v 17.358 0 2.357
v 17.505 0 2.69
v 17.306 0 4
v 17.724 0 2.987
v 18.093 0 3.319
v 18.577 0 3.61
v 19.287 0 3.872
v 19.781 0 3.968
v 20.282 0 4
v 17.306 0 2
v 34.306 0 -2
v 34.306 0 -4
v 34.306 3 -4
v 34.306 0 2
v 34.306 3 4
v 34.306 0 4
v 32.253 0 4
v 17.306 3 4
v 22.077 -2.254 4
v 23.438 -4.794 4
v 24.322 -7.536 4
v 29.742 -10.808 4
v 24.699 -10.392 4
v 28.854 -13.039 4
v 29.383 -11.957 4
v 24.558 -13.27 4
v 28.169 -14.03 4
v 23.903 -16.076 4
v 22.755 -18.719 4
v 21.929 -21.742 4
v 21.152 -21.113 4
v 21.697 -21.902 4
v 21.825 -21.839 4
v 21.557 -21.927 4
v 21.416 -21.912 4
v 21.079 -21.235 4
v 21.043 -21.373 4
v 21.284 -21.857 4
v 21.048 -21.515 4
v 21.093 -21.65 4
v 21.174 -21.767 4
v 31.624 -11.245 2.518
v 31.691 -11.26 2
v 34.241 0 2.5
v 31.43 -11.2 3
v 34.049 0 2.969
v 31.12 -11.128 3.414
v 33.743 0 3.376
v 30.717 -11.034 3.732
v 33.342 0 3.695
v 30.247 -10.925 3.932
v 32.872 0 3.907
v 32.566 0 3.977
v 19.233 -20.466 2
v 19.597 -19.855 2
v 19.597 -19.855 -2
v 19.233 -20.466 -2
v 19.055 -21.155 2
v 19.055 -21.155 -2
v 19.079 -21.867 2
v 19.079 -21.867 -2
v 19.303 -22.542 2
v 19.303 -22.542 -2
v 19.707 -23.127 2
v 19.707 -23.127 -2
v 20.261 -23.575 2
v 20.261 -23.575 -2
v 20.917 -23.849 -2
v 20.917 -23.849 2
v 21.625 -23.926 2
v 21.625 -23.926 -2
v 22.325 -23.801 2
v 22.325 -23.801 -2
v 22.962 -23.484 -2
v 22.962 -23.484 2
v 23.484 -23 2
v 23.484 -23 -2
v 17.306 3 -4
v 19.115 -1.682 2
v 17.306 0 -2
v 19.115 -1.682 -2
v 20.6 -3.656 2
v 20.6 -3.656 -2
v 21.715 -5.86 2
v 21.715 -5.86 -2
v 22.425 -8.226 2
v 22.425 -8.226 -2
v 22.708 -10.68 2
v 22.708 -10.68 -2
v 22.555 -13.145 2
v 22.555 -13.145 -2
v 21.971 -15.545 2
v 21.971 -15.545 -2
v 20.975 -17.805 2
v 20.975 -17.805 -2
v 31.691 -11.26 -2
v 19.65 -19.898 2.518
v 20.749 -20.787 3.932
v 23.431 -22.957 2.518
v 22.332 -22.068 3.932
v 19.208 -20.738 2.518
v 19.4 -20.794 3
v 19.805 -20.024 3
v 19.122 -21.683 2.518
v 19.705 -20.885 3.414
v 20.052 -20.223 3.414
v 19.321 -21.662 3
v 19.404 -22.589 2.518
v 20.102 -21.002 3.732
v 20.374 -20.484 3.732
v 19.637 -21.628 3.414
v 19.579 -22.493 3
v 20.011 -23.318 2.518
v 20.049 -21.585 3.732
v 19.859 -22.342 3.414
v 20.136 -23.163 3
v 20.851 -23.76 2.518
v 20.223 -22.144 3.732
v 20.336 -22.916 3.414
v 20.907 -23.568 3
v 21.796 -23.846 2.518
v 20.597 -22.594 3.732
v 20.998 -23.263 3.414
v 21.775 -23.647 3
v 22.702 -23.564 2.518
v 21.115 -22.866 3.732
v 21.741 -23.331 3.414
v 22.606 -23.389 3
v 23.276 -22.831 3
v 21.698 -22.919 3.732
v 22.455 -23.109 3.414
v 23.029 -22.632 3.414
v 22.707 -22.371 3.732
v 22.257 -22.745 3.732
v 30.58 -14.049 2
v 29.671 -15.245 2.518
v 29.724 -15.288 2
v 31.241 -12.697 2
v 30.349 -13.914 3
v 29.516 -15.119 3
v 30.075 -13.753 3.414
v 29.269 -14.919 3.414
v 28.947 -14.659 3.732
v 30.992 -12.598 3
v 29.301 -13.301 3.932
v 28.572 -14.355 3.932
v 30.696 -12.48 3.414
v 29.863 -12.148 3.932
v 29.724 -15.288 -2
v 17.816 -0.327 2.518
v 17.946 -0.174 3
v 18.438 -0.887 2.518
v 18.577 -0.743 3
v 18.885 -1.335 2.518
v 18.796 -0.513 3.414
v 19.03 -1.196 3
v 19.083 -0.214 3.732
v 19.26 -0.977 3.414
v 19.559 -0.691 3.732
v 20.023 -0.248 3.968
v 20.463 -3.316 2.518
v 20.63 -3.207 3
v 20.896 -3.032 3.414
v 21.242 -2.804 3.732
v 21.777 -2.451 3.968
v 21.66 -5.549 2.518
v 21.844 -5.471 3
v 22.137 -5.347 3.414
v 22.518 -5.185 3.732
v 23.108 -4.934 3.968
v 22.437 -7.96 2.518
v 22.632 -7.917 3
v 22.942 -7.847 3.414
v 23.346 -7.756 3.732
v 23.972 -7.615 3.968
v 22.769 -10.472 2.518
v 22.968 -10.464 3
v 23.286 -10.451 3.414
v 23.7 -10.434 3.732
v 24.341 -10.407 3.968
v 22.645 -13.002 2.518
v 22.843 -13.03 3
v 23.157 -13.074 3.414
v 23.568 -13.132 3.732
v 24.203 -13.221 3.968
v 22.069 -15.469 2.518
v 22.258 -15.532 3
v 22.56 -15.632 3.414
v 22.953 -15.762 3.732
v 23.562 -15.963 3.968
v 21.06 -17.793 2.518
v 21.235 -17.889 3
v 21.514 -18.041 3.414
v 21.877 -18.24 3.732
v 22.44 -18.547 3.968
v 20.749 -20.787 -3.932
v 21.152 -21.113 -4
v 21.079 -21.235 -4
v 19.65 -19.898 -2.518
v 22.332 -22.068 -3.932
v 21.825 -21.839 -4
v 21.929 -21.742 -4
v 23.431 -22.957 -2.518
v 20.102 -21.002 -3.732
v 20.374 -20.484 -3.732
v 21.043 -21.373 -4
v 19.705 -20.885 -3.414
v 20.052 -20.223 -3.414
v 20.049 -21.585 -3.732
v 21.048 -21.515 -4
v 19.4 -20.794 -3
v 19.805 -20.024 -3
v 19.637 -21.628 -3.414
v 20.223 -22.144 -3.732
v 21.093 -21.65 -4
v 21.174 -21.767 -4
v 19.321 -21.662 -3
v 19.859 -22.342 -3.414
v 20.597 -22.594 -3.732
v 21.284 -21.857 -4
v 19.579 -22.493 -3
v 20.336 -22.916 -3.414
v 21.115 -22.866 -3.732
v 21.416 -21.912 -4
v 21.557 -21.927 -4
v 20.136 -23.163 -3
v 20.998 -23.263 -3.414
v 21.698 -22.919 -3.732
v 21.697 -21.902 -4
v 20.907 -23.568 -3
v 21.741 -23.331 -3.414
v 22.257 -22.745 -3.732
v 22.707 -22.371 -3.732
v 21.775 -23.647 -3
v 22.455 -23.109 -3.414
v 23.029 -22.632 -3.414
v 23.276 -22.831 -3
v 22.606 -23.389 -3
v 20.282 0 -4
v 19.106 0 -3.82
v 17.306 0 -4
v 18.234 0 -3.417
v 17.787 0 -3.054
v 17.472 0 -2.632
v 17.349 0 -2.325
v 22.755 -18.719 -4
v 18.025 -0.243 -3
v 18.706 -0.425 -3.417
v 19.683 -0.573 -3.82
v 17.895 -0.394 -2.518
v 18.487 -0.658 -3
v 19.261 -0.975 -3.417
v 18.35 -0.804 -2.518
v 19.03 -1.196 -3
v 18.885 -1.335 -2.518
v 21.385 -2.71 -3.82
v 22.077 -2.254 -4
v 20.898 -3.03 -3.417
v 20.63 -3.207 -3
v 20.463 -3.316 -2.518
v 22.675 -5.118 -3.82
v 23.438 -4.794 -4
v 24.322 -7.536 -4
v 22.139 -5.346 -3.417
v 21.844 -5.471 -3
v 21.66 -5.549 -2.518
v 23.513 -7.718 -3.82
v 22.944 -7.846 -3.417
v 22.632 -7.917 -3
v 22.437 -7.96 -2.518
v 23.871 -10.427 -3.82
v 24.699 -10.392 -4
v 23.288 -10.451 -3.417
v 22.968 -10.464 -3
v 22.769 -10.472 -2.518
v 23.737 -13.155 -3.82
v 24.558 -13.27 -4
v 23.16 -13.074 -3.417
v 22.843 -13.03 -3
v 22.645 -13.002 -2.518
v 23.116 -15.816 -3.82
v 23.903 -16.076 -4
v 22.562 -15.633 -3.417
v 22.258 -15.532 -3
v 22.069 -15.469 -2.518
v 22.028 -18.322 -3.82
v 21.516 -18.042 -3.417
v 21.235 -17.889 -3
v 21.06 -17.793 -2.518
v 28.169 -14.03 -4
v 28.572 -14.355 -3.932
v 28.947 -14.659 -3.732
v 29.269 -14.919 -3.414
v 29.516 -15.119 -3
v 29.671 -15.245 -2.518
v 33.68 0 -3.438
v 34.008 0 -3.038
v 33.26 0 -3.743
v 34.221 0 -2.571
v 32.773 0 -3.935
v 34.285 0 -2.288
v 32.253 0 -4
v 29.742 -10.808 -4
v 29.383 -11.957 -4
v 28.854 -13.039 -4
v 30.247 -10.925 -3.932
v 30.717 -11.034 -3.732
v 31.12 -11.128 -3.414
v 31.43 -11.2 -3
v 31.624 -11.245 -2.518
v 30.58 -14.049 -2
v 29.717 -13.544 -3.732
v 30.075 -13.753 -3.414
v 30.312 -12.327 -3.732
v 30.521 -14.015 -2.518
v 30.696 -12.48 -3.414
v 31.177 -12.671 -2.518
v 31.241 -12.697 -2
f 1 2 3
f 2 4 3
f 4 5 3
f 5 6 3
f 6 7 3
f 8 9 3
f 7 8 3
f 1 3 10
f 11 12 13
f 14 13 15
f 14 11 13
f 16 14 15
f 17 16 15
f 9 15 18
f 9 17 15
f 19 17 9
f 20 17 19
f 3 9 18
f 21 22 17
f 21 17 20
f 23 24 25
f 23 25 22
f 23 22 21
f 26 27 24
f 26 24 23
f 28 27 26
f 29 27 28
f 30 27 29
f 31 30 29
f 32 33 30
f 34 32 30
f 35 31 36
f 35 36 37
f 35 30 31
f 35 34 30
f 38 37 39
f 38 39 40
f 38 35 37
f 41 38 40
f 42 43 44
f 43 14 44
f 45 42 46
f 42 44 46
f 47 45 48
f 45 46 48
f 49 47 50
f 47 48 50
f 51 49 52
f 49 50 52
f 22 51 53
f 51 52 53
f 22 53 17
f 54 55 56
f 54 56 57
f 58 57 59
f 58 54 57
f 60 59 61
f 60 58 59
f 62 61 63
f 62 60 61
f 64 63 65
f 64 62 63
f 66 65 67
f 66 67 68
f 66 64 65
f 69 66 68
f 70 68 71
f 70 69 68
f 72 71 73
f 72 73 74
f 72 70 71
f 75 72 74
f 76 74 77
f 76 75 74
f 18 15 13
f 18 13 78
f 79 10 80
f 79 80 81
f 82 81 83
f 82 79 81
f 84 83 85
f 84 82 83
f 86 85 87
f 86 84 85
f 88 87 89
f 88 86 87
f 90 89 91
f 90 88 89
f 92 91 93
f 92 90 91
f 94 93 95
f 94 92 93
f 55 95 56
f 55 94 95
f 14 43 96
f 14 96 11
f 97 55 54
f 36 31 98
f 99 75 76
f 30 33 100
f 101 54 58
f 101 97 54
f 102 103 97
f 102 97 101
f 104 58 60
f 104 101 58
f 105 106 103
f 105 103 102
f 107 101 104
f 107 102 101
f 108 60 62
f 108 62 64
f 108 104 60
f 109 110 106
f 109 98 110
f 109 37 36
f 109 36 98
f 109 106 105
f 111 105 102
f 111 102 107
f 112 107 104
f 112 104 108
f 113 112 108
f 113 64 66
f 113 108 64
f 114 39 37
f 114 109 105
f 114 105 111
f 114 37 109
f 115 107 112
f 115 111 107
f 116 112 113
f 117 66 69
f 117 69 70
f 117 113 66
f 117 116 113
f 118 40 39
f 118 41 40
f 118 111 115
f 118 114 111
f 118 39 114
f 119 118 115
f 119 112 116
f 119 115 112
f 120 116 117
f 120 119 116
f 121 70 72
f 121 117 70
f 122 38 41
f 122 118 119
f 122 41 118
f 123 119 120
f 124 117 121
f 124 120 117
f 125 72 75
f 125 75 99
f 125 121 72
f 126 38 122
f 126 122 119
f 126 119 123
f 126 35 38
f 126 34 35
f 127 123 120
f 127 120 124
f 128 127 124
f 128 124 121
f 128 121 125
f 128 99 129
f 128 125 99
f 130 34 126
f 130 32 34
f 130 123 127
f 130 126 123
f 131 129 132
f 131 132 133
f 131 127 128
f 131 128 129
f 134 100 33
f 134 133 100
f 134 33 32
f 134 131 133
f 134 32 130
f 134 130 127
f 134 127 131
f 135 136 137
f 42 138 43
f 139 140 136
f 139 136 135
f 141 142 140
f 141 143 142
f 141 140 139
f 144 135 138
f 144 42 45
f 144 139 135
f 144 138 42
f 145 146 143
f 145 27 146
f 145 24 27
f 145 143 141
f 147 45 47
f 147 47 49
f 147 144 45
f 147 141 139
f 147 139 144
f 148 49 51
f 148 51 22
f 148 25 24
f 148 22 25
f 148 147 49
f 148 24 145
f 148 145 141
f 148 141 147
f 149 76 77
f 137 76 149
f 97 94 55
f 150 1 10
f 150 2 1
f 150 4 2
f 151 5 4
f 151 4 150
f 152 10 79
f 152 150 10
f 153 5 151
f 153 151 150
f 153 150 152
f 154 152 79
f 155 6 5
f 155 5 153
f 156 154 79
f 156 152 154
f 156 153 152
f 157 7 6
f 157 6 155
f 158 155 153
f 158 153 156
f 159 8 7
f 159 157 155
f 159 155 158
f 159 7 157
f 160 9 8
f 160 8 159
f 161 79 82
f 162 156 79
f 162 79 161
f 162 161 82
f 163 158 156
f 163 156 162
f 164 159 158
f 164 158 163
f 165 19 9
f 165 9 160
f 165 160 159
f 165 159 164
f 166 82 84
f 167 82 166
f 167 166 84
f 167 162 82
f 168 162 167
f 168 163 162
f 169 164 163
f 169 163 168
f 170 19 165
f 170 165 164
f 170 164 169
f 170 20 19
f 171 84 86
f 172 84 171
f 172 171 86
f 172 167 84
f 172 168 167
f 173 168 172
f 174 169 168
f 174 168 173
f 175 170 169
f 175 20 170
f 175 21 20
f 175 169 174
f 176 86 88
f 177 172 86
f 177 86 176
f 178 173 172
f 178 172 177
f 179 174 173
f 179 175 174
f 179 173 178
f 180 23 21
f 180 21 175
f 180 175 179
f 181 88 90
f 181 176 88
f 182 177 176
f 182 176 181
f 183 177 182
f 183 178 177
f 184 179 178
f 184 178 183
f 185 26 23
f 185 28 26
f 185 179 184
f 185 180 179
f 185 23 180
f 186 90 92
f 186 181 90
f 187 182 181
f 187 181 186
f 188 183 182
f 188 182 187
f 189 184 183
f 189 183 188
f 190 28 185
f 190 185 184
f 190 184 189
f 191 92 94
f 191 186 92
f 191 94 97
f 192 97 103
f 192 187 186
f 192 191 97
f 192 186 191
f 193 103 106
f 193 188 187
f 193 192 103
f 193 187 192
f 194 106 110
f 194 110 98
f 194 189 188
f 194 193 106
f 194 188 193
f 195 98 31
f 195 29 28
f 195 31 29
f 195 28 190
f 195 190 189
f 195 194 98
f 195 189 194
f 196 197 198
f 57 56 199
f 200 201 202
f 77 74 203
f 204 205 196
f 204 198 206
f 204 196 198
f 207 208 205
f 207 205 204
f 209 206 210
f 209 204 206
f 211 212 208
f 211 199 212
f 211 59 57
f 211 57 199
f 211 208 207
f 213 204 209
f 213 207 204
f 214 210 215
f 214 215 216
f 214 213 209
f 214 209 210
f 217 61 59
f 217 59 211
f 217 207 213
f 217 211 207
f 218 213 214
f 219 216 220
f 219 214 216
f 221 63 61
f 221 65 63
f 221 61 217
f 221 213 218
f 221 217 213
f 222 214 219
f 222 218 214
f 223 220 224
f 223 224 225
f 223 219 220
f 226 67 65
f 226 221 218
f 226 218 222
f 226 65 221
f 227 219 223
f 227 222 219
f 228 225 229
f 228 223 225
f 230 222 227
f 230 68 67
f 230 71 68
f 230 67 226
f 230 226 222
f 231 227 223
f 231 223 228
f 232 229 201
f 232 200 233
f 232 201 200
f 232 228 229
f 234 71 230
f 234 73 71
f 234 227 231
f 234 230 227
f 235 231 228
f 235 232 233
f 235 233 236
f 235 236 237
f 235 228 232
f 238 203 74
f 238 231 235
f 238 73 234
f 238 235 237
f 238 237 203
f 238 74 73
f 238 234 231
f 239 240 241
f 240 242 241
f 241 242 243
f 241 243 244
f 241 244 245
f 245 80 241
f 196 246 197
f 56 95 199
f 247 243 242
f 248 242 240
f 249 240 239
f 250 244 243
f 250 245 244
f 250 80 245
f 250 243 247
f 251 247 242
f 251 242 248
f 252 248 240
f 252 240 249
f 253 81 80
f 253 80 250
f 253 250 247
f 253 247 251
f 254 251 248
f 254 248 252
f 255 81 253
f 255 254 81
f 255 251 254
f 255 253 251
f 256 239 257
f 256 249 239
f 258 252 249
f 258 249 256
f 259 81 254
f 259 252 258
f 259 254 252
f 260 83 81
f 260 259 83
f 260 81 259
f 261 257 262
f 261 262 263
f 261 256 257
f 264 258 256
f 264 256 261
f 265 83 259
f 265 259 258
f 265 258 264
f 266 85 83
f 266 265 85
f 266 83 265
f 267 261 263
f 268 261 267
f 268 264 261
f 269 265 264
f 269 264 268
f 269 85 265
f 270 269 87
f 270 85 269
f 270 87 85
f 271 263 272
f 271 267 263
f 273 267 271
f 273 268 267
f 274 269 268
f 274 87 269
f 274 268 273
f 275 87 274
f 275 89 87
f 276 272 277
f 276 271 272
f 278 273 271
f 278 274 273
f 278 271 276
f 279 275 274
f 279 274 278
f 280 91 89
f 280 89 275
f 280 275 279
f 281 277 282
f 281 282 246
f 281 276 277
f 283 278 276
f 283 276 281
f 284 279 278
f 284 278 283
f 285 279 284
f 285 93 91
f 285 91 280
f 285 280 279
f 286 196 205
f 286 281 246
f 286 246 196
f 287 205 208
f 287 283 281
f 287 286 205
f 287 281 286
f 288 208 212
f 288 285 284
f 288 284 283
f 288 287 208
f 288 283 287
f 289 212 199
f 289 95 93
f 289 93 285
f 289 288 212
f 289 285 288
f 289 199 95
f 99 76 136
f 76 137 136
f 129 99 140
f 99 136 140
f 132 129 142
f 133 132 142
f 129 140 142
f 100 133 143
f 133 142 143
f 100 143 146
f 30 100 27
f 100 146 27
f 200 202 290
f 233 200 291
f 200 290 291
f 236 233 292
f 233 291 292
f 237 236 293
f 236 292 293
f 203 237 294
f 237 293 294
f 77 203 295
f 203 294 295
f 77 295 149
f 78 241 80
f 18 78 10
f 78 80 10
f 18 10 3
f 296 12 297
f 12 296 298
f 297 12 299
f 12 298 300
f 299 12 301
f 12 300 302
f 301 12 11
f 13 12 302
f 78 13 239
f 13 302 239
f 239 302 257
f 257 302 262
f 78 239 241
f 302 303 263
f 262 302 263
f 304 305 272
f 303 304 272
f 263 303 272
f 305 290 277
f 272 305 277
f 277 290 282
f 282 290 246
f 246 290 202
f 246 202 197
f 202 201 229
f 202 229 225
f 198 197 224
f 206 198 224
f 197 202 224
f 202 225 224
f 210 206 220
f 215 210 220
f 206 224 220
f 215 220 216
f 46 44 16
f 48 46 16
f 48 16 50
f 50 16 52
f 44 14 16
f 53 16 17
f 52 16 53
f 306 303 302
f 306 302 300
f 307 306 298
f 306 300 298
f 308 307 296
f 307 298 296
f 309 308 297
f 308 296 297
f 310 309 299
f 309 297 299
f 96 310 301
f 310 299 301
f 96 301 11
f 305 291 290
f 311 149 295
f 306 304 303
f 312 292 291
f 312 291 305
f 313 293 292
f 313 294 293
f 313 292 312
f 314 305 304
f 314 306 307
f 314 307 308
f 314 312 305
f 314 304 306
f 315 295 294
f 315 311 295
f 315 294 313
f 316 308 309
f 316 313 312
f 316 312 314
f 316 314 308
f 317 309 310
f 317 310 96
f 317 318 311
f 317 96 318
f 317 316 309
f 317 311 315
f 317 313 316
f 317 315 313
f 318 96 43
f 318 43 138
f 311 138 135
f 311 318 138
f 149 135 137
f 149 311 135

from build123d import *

# Parameters (mm, degrees)
F1_DEPTH = 4
F2_R     = 10
F3_R     = 2
F4_W     = 17
F4_H     = 8
F5_DEPTH = 3


with BuildPart() as f1:
    # F0 (on Top) → F1 (new body, symmetric)
    with BuildSketch(Plane.XY):
        with BuildLine():
            Line((31.1703724303, -13.5), (34.3061052263, 0))
            Line((34.3061052263, 0), (17.3061052263, 0))
            ThreePointArc((17.3061052263, 0), (22.6203428996, -9.4465185643), (19.5969211067, -19.8550129652))
            ThreePointArc((19.5969211067, -19.8550129652), (19.9679460836, -23.371024977), (23.4839580953, -23))
            Line((23.4839580953, -23), (31.1703724303, -13.5))
        make_face()
    extrude(amount=F1_DEPTH, both=True)

    # F2
    f2_edges = [f1.edges().sort_by_distance(p)[0] for p in [
        (31.170372, -13.5, 0),
    ]]
    fillet(f2_edges, radius=F2_R)

    # F3
    f3_edges = [f1.edges().sort_by_distance(p)[0] for p in [
        (32.998368, -5.630086, 4),
        (30.935867, -13.38549, 4),
        (26.603989, -19.143807, 4),
        (19.967946, -23.371025, 4),
        (22.620343, -9.446519, 4),
        (22.620343, -9.446519, -4),
        (19.967946, -23.371025, -4),
        (26.603989, -19.143807, -4),
        (30.935867, -13.38549, -4),
        (32.998368, -5.630086, -4),
    ]]
    fillet(f3_edges, radius=F3_R)

    # F4 (on face) → F5 (join)
    with BuildSketch(Plane(origin=(0, 0, 0), x_dir=(-1, 0, 0), z_dir=(0, 1, 0))):
        with Locations((-25.8061052263, 0)):
            Rectangle(F4_W, F4_H)
    extrude(amount=F5_DEPTH)


solid = f1.part
